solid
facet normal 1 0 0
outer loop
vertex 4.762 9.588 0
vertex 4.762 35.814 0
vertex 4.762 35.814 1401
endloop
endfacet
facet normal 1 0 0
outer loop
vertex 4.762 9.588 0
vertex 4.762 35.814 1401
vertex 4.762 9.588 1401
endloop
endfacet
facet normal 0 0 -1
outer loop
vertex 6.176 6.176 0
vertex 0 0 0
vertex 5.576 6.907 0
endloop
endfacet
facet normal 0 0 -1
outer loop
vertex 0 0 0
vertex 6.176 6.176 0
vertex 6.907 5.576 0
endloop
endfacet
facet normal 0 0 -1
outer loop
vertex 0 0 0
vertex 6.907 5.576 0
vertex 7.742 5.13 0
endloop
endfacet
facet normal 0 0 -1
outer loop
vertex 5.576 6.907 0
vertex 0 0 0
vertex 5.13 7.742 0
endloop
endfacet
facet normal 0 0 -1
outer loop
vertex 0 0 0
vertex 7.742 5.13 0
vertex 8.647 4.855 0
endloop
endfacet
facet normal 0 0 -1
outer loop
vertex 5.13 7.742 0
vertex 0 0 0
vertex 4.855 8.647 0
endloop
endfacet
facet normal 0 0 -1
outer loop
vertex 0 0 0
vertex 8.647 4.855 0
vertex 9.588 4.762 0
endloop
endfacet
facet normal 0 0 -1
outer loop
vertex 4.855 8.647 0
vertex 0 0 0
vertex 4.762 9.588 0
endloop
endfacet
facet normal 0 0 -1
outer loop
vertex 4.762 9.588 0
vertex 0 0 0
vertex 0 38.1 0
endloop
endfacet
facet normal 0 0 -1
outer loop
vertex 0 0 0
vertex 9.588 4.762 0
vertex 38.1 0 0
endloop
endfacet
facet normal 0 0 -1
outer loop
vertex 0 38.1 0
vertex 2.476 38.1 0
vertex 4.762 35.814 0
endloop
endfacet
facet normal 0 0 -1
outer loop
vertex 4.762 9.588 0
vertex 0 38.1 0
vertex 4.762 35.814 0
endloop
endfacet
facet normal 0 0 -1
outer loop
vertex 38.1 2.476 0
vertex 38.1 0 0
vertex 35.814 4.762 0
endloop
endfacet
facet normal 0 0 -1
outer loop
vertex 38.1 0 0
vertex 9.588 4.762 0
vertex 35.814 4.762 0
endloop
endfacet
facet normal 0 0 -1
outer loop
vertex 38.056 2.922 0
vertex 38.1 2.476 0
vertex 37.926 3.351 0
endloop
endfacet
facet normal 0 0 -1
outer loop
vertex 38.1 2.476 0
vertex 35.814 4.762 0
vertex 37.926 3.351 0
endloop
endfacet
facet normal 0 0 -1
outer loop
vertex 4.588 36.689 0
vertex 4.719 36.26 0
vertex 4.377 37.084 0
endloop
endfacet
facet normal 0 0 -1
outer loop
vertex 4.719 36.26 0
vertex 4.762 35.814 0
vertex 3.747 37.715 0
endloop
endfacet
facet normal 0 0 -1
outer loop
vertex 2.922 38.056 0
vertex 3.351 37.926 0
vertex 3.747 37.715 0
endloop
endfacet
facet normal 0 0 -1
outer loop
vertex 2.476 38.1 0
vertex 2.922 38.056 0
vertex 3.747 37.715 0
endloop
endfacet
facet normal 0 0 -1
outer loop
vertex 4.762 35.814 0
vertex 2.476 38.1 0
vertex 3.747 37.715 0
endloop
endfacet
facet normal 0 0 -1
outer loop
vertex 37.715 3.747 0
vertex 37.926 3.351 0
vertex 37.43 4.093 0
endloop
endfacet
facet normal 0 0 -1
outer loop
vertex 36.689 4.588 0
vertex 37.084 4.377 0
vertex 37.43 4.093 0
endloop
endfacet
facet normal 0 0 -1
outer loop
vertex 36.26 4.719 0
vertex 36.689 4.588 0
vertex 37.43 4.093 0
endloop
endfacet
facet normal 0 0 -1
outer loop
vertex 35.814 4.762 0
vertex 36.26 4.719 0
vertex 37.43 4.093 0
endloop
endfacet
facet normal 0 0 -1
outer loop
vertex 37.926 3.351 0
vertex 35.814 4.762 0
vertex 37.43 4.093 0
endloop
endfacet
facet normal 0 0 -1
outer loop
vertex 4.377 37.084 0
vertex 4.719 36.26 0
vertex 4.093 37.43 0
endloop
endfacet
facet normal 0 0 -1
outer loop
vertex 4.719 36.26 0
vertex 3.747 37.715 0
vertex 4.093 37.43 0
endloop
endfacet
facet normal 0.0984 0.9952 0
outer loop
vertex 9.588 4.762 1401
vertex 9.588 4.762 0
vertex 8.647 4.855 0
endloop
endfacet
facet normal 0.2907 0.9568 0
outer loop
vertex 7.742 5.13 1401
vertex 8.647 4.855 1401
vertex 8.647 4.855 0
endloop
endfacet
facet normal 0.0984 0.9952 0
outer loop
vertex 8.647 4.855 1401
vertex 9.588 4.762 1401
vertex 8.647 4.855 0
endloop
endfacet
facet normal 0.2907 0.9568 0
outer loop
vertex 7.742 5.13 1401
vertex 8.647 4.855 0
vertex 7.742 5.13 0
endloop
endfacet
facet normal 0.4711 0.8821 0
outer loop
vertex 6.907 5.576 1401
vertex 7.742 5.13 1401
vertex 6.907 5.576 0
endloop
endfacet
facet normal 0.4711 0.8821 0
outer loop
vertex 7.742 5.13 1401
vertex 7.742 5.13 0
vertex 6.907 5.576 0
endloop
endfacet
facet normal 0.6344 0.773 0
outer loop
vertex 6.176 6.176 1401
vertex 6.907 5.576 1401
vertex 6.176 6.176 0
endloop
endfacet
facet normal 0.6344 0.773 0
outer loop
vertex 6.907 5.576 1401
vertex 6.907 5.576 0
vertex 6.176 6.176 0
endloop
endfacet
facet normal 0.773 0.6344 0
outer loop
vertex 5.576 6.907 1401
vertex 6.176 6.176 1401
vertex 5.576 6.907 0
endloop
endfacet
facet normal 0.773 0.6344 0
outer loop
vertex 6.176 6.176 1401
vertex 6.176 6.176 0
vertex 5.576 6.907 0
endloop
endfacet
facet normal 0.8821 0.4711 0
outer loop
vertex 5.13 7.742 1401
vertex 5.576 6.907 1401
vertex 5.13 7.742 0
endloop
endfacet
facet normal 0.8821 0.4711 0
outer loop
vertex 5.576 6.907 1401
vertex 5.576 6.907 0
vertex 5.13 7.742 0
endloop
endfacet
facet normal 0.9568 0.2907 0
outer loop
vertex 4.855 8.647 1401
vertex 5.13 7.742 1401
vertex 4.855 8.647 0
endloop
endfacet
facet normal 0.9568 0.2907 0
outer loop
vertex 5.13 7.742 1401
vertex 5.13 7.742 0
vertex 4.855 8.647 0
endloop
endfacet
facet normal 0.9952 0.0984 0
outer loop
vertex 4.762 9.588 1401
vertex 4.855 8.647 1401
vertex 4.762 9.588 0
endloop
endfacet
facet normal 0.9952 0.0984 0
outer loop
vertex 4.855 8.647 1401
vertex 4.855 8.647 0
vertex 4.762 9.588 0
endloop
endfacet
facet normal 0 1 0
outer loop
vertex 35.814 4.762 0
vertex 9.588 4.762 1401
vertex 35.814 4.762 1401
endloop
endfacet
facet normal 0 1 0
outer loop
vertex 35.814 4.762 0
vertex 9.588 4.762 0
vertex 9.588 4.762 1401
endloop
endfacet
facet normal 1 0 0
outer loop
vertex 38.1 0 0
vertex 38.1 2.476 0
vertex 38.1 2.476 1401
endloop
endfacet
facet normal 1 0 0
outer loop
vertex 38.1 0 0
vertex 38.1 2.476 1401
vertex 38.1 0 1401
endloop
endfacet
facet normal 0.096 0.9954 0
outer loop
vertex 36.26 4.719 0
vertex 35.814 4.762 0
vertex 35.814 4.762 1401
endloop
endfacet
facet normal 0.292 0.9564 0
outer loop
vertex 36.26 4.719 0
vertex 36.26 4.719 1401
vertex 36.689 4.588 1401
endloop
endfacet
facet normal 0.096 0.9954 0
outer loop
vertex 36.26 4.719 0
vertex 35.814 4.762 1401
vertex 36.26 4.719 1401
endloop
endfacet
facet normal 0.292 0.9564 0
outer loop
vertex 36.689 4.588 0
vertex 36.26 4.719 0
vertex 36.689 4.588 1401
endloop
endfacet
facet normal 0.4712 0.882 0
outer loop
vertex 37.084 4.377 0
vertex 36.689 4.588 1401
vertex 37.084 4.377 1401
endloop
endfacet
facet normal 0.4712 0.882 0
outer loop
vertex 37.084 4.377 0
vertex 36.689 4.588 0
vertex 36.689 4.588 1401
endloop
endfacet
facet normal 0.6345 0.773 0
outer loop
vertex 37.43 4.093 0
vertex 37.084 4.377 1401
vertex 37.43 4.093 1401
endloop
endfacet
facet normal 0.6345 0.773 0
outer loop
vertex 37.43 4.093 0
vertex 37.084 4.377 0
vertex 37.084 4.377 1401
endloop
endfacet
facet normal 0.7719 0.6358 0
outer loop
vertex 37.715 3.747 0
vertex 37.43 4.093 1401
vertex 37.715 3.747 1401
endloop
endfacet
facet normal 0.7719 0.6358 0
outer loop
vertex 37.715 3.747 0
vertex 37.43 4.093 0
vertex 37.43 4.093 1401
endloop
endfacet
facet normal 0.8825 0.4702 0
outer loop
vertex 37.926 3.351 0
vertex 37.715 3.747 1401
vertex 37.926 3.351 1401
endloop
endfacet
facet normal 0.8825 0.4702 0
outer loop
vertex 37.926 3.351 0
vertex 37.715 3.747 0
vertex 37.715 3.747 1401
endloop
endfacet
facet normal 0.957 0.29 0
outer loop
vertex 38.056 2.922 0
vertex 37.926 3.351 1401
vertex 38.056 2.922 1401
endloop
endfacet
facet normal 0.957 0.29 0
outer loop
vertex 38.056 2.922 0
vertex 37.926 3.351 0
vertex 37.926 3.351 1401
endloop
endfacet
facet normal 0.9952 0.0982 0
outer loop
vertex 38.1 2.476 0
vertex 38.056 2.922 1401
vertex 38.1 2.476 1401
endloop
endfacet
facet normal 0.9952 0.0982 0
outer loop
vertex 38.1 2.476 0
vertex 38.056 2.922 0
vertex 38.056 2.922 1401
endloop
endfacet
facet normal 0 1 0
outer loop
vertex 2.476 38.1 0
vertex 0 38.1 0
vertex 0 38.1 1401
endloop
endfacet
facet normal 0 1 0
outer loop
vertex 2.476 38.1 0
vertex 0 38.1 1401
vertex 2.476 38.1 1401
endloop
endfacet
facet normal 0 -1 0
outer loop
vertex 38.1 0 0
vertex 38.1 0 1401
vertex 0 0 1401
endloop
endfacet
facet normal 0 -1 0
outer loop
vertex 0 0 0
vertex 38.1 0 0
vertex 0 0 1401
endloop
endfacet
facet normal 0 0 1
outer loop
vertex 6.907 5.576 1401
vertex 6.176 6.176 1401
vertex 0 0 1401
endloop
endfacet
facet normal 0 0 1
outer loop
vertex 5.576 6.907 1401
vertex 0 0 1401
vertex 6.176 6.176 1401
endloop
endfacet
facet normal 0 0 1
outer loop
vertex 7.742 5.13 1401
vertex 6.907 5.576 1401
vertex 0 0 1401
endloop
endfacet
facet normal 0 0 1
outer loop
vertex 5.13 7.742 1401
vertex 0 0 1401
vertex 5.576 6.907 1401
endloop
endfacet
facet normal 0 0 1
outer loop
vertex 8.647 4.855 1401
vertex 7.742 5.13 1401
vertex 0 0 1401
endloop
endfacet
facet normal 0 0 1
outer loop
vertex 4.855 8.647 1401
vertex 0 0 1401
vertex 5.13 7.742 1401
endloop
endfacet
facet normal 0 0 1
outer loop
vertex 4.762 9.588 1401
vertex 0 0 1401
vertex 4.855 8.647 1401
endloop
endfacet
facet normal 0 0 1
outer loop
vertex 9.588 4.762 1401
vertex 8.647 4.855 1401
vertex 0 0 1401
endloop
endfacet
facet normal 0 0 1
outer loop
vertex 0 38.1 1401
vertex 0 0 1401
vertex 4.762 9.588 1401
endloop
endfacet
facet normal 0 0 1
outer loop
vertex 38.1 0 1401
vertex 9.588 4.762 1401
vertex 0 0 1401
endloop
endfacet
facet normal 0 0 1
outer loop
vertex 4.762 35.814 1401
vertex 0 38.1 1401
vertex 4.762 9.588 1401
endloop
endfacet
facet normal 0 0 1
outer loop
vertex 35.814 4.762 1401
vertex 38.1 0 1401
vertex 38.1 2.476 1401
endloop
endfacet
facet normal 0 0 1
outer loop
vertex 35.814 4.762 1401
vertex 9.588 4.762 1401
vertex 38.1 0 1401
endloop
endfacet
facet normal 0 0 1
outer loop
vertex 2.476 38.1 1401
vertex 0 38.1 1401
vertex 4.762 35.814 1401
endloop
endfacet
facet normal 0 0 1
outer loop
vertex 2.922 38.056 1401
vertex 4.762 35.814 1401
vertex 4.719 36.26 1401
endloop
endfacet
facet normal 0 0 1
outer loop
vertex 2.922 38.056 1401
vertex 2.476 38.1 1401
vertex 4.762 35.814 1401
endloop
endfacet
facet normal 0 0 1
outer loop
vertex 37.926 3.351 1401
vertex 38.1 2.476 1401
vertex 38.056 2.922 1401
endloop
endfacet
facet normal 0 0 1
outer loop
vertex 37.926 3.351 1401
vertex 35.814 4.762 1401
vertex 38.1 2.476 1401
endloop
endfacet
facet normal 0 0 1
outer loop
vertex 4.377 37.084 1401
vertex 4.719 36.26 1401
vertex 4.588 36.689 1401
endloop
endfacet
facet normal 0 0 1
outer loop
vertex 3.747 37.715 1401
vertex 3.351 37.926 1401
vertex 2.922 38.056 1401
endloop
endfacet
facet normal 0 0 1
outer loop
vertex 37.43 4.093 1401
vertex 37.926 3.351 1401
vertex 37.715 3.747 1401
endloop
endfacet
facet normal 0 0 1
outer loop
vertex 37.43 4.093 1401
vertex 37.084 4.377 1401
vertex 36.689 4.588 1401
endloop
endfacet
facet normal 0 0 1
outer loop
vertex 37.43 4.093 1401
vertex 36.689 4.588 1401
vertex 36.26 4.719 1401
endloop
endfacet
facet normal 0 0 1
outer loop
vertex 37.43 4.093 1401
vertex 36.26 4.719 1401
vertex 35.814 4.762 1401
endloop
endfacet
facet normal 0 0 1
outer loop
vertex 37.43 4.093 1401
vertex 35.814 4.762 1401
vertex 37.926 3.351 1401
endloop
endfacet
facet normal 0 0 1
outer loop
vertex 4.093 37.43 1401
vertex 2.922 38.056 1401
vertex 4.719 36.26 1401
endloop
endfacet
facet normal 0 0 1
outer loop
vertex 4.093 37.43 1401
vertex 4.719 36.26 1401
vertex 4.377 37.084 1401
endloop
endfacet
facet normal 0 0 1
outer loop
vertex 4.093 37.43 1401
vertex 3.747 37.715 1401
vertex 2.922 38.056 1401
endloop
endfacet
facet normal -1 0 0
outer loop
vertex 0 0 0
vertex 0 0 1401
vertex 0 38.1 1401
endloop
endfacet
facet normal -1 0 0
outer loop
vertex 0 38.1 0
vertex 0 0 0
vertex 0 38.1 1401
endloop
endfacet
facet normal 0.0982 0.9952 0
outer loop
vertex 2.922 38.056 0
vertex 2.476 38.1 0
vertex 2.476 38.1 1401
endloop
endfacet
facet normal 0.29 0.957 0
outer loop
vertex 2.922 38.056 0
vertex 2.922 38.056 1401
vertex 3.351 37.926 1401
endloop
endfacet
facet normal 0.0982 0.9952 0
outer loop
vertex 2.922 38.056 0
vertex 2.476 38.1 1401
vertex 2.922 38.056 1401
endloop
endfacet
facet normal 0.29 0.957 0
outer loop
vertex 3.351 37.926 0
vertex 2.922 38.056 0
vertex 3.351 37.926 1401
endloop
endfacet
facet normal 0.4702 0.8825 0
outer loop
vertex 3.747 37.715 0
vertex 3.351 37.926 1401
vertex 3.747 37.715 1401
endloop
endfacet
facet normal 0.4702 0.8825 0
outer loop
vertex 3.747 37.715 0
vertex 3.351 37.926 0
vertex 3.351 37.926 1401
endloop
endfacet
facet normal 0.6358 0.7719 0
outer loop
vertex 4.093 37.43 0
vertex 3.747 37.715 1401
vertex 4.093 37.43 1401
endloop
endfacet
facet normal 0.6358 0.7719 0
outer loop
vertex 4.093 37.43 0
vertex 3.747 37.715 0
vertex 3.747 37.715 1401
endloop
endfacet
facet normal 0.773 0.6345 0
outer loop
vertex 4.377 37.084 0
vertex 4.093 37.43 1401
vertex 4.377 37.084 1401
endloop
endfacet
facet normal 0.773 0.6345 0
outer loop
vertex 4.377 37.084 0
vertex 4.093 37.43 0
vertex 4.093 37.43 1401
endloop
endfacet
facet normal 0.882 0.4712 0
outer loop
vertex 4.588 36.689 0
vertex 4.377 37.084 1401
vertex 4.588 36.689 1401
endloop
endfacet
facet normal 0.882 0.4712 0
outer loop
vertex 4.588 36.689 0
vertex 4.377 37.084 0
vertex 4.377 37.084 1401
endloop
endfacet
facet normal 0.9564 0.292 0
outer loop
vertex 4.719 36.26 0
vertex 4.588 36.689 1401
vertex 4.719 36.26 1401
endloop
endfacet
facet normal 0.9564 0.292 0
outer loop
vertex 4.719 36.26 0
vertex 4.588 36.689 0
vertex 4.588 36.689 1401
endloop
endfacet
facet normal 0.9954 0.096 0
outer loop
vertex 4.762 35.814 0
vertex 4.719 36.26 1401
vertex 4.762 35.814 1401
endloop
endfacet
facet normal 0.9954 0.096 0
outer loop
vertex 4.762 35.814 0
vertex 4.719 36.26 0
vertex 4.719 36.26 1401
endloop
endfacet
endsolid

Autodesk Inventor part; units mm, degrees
ref_plane "YZ Plane" through (0, 0, 0) normal (1, 0, 0) x (0, 1, 0)
ref_plane "Plano inicial" through (0, 0, 0) normal (0, 0, 1) x (1, 0, 0)
ref_plane "Plano final" through (0, 0, 1401) normal (0, 0, 1) x (1, 0, 0)
sketch "Boceto" plane through (0, 0, 0) normal (0, 0, 1) x (1, 0, 0)
  line L0 (38.1, 0) -> (0, 0)
  line L1 (0, 0) -> (0, 38.1)
  line L2 (0, 38.1) -> (2.4765, 38.1)
  line L3 (4.7625, 35.814) -> (4.7625, 9.5885)
  line L4 (9.5885, 4.7625) -> (35.814, 4.7625)
  line L5 (38.1, 2.4765) -> (38.1, 0)
  line L6 (0, -11.0414) -> (0, 31.5385) construction
  line L7 (-11.0414, 0) -> (31.5385, 0) construction
  arc A0 (4.7625, 9.5885) -> (9.5885, 4.7625) centre (9.5885, 9.5885) ccw
  arc A1 (4.7625, 35.814) -> (2.4765, 38.1) centre (2.4765, 35.814) ccw
  arc A2 (38.1, 2.4765) -> (35.814, 4.7625) centre (35.814, 2.4765) ccw
  line L8 (0, 48.4964) -> (0, -20.9644) construction
  line L9 (-20.9644, 0) -> (48.4964, 0) construction
  point P0 (4.7625, 38.1)
  point P1 (4.7625, 4.7625)
  point P2 (38.1, 4.7625)
  dimension "d0" = 38.1
  dimension "d1" = 38.1
  dimension "d2" = 4.7625
  dimension "d3" = 4.7625
  dimension "d10" = 0
  dimension "d11" = 0
  dimension "d14" = 4.826
  dimension "d15" = 2.286
extrude "Cuerpo" add sketch "Boceto" along normal up to surface (1401 mm away) from surface at 0
sketch "Sketch3" plane through (0, 0, 0) normal (0, 0, 1) x (1, 0, 0)
  line L0 (0, 0) -> (10, 0)
ref_plane "Work Plane3" through (0, 0, 0) normal (0, -1, 0) x (1, 0, 0)
sketch "Sketch4" plane through (0, 0, 0) normal (0, -1, 0) x (1, 0, 0)
  line L0 (-2, 0) -> (12, 0)
  line L1 (-2, 1401) -> (12, 1401)
  dimension "d17" = 1401
equation "\"d0\" = G_H"
equation "\"d1\" = G_H"
equation "\"d2\" = G_T"
equation "\"d3\" = G_T"
equation "\"d14\" = G_IR"
equation "\"d15\" = G_ER"
equation "\"d4\" = G_L"
equation "\"G_H\" = 38.1"
equation "\"G_T\" = 4.7625"
equation "\"G_ER\" = 2.286"
equation "\"G_IR\" = 4.826"
equation "\"G_L\" = d17"
equation "\"ex\" = 0"
equation "\"G_OFFSET_START\" = 0"
equation "\"G_OFFSET_END\" = 0"
equation "\"d13\" = G_OFFSET_END + B_L"
equation "\"B_L\" = 1401"
properties part number "AISC - L 1,5 x 1,5 x 3/16 - 55,157" material "Acero, suave"
